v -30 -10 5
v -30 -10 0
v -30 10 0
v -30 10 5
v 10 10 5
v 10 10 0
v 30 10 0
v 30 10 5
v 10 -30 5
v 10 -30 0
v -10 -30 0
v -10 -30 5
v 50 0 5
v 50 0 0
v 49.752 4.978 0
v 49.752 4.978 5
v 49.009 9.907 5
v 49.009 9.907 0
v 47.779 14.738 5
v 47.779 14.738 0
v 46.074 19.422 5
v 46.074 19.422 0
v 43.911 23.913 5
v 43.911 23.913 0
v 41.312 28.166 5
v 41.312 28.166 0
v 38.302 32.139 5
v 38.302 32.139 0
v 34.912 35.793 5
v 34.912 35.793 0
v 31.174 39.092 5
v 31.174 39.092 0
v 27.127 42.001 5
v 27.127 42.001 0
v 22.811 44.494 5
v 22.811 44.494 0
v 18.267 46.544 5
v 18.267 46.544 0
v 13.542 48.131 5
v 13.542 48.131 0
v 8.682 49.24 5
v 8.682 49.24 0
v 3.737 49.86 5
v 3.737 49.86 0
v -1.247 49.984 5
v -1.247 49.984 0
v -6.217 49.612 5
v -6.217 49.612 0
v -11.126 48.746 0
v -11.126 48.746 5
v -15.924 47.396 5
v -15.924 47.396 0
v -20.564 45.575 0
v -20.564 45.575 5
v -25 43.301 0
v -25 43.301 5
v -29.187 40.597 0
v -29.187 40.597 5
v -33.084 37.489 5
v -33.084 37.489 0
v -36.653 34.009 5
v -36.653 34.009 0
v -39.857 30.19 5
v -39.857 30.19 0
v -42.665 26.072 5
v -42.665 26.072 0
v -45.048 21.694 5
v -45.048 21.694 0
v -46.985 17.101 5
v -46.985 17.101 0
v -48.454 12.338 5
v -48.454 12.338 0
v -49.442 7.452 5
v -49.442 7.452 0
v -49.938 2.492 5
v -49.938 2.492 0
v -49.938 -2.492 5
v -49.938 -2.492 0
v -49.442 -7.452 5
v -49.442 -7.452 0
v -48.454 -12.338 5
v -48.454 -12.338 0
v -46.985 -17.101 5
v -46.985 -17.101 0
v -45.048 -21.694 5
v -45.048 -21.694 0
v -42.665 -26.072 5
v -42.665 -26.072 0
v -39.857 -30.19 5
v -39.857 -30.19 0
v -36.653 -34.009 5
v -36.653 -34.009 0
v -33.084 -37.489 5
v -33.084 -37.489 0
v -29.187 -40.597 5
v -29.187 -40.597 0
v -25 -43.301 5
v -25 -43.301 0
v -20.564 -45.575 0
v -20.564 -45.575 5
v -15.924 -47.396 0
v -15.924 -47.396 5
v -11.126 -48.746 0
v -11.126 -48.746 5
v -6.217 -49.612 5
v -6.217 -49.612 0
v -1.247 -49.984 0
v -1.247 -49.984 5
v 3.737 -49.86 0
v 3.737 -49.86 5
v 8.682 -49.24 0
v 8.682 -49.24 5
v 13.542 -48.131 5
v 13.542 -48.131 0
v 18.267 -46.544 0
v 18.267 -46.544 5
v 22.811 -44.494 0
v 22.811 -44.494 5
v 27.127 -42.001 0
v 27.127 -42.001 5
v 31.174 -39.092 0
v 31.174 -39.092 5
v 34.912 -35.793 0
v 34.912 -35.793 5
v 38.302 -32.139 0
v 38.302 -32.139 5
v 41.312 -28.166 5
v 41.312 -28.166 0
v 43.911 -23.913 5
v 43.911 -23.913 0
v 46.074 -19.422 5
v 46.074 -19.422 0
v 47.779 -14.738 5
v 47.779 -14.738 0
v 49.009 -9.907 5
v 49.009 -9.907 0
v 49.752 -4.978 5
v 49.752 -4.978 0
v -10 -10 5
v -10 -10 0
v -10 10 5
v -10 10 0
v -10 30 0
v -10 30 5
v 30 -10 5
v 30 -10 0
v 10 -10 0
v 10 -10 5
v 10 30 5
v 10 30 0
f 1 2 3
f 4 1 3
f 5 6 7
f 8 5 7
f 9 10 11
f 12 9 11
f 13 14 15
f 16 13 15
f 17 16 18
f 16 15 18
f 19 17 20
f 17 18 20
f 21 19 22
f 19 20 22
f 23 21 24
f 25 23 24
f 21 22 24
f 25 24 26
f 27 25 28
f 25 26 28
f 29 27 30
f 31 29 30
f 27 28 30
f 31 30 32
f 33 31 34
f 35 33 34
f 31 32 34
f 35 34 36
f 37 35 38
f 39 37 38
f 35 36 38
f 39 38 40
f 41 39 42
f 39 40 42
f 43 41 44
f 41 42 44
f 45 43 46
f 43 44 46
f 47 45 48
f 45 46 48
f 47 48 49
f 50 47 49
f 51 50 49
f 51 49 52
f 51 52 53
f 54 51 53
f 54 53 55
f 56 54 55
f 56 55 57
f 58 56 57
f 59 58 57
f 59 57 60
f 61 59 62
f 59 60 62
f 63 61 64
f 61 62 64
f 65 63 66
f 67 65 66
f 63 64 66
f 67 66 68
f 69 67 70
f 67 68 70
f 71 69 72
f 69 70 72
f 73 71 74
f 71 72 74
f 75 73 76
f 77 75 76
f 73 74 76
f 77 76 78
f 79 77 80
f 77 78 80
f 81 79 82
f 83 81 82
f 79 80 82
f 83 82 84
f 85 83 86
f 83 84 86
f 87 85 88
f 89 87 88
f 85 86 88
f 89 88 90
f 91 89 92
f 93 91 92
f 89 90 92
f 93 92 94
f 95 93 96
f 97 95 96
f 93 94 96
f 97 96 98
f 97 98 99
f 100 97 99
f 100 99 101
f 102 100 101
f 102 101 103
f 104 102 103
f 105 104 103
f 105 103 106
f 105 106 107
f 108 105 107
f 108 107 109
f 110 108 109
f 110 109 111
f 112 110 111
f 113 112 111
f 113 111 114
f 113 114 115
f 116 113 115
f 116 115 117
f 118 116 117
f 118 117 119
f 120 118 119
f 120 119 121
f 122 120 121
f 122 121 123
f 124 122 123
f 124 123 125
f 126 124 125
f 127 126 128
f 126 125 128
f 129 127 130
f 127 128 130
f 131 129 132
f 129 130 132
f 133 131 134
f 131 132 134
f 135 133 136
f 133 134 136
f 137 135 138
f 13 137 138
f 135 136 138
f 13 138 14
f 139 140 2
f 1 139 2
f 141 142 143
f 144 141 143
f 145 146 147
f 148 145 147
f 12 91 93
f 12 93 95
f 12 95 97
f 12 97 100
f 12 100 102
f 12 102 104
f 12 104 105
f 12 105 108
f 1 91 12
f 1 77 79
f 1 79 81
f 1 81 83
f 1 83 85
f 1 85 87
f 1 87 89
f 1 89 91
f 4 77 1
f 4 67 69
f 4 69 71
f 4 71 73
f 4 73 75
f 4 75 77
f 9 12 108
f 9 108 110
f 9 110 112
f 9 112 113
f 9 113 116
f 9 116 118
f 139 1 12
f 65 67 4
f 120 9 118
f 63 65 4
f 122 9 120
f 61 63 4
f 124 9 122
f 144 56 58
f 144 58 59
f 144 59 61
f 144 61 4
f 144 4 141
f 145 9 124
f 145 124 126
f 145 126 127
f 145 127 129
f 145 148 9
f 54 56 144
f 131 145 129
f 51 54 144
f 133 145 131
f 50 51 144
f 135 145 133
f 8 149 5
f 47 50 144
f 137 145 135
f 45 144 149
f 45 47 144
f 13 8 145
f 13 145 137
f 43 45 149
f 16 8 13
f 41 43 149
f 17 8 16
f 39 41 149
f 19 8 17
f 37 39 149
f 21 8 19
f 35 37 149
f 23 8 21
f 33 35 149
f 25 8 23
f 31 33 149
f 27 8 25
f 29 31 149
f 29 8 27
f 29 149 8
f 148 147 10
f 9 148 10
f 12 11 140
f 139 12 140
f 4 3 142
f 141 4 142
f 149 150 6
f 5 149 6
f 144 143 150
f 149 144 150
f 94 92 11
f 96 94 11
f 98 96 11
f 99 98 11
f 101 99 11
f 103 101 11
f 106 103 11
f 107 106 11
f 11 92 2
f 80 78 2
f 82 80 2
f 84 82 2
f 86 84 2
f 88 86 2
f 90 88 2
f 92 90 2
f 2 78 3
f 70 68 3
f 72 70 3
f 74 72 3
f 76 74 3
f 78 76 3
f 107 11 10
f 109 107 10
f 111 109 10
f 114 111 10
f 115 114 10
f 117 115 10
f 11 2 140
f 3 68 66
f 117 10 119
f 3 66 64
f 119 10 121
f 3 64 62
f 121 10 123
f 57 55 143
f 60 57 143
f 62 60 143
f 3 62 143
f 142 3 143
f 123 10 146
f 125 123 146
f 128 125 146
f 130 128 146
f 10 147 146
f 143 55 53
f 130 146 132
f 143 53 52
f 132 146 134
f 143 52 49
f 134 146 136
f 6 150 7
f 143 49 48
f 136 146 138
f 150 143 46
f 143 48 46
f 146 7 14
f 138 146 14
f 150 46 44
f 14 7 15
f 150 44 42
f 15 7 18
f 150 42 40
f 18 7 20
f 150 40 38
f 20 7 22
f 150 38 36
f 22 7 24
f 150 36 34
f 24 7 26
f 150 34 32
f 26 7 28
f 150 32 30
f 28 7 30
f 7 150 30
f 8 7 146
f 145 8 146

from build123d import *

# Parameters (mm, degrees)
F0_R     = 50
F1_DEPTH = 5


with BuildPart() as f1:
    # F0 (on Top) → F1 (new body)
    with BuildSketch(Plane.XY):
        Circle(F0_R)
        Polygon((-10, 30), (0, 30), (10, 30), (10, 10), (30, 10), (30, 0), (30, -10), (10, -10), (10, -30), (0, -30), (-10, -30), (-10, -10), (-30, -10), (-30, 0), (-30, 10), (-10, 10), align=None, mode=Mode.SUBTRACT)
    extrude(amount=F1_DEPTH)


solid = f1.part
